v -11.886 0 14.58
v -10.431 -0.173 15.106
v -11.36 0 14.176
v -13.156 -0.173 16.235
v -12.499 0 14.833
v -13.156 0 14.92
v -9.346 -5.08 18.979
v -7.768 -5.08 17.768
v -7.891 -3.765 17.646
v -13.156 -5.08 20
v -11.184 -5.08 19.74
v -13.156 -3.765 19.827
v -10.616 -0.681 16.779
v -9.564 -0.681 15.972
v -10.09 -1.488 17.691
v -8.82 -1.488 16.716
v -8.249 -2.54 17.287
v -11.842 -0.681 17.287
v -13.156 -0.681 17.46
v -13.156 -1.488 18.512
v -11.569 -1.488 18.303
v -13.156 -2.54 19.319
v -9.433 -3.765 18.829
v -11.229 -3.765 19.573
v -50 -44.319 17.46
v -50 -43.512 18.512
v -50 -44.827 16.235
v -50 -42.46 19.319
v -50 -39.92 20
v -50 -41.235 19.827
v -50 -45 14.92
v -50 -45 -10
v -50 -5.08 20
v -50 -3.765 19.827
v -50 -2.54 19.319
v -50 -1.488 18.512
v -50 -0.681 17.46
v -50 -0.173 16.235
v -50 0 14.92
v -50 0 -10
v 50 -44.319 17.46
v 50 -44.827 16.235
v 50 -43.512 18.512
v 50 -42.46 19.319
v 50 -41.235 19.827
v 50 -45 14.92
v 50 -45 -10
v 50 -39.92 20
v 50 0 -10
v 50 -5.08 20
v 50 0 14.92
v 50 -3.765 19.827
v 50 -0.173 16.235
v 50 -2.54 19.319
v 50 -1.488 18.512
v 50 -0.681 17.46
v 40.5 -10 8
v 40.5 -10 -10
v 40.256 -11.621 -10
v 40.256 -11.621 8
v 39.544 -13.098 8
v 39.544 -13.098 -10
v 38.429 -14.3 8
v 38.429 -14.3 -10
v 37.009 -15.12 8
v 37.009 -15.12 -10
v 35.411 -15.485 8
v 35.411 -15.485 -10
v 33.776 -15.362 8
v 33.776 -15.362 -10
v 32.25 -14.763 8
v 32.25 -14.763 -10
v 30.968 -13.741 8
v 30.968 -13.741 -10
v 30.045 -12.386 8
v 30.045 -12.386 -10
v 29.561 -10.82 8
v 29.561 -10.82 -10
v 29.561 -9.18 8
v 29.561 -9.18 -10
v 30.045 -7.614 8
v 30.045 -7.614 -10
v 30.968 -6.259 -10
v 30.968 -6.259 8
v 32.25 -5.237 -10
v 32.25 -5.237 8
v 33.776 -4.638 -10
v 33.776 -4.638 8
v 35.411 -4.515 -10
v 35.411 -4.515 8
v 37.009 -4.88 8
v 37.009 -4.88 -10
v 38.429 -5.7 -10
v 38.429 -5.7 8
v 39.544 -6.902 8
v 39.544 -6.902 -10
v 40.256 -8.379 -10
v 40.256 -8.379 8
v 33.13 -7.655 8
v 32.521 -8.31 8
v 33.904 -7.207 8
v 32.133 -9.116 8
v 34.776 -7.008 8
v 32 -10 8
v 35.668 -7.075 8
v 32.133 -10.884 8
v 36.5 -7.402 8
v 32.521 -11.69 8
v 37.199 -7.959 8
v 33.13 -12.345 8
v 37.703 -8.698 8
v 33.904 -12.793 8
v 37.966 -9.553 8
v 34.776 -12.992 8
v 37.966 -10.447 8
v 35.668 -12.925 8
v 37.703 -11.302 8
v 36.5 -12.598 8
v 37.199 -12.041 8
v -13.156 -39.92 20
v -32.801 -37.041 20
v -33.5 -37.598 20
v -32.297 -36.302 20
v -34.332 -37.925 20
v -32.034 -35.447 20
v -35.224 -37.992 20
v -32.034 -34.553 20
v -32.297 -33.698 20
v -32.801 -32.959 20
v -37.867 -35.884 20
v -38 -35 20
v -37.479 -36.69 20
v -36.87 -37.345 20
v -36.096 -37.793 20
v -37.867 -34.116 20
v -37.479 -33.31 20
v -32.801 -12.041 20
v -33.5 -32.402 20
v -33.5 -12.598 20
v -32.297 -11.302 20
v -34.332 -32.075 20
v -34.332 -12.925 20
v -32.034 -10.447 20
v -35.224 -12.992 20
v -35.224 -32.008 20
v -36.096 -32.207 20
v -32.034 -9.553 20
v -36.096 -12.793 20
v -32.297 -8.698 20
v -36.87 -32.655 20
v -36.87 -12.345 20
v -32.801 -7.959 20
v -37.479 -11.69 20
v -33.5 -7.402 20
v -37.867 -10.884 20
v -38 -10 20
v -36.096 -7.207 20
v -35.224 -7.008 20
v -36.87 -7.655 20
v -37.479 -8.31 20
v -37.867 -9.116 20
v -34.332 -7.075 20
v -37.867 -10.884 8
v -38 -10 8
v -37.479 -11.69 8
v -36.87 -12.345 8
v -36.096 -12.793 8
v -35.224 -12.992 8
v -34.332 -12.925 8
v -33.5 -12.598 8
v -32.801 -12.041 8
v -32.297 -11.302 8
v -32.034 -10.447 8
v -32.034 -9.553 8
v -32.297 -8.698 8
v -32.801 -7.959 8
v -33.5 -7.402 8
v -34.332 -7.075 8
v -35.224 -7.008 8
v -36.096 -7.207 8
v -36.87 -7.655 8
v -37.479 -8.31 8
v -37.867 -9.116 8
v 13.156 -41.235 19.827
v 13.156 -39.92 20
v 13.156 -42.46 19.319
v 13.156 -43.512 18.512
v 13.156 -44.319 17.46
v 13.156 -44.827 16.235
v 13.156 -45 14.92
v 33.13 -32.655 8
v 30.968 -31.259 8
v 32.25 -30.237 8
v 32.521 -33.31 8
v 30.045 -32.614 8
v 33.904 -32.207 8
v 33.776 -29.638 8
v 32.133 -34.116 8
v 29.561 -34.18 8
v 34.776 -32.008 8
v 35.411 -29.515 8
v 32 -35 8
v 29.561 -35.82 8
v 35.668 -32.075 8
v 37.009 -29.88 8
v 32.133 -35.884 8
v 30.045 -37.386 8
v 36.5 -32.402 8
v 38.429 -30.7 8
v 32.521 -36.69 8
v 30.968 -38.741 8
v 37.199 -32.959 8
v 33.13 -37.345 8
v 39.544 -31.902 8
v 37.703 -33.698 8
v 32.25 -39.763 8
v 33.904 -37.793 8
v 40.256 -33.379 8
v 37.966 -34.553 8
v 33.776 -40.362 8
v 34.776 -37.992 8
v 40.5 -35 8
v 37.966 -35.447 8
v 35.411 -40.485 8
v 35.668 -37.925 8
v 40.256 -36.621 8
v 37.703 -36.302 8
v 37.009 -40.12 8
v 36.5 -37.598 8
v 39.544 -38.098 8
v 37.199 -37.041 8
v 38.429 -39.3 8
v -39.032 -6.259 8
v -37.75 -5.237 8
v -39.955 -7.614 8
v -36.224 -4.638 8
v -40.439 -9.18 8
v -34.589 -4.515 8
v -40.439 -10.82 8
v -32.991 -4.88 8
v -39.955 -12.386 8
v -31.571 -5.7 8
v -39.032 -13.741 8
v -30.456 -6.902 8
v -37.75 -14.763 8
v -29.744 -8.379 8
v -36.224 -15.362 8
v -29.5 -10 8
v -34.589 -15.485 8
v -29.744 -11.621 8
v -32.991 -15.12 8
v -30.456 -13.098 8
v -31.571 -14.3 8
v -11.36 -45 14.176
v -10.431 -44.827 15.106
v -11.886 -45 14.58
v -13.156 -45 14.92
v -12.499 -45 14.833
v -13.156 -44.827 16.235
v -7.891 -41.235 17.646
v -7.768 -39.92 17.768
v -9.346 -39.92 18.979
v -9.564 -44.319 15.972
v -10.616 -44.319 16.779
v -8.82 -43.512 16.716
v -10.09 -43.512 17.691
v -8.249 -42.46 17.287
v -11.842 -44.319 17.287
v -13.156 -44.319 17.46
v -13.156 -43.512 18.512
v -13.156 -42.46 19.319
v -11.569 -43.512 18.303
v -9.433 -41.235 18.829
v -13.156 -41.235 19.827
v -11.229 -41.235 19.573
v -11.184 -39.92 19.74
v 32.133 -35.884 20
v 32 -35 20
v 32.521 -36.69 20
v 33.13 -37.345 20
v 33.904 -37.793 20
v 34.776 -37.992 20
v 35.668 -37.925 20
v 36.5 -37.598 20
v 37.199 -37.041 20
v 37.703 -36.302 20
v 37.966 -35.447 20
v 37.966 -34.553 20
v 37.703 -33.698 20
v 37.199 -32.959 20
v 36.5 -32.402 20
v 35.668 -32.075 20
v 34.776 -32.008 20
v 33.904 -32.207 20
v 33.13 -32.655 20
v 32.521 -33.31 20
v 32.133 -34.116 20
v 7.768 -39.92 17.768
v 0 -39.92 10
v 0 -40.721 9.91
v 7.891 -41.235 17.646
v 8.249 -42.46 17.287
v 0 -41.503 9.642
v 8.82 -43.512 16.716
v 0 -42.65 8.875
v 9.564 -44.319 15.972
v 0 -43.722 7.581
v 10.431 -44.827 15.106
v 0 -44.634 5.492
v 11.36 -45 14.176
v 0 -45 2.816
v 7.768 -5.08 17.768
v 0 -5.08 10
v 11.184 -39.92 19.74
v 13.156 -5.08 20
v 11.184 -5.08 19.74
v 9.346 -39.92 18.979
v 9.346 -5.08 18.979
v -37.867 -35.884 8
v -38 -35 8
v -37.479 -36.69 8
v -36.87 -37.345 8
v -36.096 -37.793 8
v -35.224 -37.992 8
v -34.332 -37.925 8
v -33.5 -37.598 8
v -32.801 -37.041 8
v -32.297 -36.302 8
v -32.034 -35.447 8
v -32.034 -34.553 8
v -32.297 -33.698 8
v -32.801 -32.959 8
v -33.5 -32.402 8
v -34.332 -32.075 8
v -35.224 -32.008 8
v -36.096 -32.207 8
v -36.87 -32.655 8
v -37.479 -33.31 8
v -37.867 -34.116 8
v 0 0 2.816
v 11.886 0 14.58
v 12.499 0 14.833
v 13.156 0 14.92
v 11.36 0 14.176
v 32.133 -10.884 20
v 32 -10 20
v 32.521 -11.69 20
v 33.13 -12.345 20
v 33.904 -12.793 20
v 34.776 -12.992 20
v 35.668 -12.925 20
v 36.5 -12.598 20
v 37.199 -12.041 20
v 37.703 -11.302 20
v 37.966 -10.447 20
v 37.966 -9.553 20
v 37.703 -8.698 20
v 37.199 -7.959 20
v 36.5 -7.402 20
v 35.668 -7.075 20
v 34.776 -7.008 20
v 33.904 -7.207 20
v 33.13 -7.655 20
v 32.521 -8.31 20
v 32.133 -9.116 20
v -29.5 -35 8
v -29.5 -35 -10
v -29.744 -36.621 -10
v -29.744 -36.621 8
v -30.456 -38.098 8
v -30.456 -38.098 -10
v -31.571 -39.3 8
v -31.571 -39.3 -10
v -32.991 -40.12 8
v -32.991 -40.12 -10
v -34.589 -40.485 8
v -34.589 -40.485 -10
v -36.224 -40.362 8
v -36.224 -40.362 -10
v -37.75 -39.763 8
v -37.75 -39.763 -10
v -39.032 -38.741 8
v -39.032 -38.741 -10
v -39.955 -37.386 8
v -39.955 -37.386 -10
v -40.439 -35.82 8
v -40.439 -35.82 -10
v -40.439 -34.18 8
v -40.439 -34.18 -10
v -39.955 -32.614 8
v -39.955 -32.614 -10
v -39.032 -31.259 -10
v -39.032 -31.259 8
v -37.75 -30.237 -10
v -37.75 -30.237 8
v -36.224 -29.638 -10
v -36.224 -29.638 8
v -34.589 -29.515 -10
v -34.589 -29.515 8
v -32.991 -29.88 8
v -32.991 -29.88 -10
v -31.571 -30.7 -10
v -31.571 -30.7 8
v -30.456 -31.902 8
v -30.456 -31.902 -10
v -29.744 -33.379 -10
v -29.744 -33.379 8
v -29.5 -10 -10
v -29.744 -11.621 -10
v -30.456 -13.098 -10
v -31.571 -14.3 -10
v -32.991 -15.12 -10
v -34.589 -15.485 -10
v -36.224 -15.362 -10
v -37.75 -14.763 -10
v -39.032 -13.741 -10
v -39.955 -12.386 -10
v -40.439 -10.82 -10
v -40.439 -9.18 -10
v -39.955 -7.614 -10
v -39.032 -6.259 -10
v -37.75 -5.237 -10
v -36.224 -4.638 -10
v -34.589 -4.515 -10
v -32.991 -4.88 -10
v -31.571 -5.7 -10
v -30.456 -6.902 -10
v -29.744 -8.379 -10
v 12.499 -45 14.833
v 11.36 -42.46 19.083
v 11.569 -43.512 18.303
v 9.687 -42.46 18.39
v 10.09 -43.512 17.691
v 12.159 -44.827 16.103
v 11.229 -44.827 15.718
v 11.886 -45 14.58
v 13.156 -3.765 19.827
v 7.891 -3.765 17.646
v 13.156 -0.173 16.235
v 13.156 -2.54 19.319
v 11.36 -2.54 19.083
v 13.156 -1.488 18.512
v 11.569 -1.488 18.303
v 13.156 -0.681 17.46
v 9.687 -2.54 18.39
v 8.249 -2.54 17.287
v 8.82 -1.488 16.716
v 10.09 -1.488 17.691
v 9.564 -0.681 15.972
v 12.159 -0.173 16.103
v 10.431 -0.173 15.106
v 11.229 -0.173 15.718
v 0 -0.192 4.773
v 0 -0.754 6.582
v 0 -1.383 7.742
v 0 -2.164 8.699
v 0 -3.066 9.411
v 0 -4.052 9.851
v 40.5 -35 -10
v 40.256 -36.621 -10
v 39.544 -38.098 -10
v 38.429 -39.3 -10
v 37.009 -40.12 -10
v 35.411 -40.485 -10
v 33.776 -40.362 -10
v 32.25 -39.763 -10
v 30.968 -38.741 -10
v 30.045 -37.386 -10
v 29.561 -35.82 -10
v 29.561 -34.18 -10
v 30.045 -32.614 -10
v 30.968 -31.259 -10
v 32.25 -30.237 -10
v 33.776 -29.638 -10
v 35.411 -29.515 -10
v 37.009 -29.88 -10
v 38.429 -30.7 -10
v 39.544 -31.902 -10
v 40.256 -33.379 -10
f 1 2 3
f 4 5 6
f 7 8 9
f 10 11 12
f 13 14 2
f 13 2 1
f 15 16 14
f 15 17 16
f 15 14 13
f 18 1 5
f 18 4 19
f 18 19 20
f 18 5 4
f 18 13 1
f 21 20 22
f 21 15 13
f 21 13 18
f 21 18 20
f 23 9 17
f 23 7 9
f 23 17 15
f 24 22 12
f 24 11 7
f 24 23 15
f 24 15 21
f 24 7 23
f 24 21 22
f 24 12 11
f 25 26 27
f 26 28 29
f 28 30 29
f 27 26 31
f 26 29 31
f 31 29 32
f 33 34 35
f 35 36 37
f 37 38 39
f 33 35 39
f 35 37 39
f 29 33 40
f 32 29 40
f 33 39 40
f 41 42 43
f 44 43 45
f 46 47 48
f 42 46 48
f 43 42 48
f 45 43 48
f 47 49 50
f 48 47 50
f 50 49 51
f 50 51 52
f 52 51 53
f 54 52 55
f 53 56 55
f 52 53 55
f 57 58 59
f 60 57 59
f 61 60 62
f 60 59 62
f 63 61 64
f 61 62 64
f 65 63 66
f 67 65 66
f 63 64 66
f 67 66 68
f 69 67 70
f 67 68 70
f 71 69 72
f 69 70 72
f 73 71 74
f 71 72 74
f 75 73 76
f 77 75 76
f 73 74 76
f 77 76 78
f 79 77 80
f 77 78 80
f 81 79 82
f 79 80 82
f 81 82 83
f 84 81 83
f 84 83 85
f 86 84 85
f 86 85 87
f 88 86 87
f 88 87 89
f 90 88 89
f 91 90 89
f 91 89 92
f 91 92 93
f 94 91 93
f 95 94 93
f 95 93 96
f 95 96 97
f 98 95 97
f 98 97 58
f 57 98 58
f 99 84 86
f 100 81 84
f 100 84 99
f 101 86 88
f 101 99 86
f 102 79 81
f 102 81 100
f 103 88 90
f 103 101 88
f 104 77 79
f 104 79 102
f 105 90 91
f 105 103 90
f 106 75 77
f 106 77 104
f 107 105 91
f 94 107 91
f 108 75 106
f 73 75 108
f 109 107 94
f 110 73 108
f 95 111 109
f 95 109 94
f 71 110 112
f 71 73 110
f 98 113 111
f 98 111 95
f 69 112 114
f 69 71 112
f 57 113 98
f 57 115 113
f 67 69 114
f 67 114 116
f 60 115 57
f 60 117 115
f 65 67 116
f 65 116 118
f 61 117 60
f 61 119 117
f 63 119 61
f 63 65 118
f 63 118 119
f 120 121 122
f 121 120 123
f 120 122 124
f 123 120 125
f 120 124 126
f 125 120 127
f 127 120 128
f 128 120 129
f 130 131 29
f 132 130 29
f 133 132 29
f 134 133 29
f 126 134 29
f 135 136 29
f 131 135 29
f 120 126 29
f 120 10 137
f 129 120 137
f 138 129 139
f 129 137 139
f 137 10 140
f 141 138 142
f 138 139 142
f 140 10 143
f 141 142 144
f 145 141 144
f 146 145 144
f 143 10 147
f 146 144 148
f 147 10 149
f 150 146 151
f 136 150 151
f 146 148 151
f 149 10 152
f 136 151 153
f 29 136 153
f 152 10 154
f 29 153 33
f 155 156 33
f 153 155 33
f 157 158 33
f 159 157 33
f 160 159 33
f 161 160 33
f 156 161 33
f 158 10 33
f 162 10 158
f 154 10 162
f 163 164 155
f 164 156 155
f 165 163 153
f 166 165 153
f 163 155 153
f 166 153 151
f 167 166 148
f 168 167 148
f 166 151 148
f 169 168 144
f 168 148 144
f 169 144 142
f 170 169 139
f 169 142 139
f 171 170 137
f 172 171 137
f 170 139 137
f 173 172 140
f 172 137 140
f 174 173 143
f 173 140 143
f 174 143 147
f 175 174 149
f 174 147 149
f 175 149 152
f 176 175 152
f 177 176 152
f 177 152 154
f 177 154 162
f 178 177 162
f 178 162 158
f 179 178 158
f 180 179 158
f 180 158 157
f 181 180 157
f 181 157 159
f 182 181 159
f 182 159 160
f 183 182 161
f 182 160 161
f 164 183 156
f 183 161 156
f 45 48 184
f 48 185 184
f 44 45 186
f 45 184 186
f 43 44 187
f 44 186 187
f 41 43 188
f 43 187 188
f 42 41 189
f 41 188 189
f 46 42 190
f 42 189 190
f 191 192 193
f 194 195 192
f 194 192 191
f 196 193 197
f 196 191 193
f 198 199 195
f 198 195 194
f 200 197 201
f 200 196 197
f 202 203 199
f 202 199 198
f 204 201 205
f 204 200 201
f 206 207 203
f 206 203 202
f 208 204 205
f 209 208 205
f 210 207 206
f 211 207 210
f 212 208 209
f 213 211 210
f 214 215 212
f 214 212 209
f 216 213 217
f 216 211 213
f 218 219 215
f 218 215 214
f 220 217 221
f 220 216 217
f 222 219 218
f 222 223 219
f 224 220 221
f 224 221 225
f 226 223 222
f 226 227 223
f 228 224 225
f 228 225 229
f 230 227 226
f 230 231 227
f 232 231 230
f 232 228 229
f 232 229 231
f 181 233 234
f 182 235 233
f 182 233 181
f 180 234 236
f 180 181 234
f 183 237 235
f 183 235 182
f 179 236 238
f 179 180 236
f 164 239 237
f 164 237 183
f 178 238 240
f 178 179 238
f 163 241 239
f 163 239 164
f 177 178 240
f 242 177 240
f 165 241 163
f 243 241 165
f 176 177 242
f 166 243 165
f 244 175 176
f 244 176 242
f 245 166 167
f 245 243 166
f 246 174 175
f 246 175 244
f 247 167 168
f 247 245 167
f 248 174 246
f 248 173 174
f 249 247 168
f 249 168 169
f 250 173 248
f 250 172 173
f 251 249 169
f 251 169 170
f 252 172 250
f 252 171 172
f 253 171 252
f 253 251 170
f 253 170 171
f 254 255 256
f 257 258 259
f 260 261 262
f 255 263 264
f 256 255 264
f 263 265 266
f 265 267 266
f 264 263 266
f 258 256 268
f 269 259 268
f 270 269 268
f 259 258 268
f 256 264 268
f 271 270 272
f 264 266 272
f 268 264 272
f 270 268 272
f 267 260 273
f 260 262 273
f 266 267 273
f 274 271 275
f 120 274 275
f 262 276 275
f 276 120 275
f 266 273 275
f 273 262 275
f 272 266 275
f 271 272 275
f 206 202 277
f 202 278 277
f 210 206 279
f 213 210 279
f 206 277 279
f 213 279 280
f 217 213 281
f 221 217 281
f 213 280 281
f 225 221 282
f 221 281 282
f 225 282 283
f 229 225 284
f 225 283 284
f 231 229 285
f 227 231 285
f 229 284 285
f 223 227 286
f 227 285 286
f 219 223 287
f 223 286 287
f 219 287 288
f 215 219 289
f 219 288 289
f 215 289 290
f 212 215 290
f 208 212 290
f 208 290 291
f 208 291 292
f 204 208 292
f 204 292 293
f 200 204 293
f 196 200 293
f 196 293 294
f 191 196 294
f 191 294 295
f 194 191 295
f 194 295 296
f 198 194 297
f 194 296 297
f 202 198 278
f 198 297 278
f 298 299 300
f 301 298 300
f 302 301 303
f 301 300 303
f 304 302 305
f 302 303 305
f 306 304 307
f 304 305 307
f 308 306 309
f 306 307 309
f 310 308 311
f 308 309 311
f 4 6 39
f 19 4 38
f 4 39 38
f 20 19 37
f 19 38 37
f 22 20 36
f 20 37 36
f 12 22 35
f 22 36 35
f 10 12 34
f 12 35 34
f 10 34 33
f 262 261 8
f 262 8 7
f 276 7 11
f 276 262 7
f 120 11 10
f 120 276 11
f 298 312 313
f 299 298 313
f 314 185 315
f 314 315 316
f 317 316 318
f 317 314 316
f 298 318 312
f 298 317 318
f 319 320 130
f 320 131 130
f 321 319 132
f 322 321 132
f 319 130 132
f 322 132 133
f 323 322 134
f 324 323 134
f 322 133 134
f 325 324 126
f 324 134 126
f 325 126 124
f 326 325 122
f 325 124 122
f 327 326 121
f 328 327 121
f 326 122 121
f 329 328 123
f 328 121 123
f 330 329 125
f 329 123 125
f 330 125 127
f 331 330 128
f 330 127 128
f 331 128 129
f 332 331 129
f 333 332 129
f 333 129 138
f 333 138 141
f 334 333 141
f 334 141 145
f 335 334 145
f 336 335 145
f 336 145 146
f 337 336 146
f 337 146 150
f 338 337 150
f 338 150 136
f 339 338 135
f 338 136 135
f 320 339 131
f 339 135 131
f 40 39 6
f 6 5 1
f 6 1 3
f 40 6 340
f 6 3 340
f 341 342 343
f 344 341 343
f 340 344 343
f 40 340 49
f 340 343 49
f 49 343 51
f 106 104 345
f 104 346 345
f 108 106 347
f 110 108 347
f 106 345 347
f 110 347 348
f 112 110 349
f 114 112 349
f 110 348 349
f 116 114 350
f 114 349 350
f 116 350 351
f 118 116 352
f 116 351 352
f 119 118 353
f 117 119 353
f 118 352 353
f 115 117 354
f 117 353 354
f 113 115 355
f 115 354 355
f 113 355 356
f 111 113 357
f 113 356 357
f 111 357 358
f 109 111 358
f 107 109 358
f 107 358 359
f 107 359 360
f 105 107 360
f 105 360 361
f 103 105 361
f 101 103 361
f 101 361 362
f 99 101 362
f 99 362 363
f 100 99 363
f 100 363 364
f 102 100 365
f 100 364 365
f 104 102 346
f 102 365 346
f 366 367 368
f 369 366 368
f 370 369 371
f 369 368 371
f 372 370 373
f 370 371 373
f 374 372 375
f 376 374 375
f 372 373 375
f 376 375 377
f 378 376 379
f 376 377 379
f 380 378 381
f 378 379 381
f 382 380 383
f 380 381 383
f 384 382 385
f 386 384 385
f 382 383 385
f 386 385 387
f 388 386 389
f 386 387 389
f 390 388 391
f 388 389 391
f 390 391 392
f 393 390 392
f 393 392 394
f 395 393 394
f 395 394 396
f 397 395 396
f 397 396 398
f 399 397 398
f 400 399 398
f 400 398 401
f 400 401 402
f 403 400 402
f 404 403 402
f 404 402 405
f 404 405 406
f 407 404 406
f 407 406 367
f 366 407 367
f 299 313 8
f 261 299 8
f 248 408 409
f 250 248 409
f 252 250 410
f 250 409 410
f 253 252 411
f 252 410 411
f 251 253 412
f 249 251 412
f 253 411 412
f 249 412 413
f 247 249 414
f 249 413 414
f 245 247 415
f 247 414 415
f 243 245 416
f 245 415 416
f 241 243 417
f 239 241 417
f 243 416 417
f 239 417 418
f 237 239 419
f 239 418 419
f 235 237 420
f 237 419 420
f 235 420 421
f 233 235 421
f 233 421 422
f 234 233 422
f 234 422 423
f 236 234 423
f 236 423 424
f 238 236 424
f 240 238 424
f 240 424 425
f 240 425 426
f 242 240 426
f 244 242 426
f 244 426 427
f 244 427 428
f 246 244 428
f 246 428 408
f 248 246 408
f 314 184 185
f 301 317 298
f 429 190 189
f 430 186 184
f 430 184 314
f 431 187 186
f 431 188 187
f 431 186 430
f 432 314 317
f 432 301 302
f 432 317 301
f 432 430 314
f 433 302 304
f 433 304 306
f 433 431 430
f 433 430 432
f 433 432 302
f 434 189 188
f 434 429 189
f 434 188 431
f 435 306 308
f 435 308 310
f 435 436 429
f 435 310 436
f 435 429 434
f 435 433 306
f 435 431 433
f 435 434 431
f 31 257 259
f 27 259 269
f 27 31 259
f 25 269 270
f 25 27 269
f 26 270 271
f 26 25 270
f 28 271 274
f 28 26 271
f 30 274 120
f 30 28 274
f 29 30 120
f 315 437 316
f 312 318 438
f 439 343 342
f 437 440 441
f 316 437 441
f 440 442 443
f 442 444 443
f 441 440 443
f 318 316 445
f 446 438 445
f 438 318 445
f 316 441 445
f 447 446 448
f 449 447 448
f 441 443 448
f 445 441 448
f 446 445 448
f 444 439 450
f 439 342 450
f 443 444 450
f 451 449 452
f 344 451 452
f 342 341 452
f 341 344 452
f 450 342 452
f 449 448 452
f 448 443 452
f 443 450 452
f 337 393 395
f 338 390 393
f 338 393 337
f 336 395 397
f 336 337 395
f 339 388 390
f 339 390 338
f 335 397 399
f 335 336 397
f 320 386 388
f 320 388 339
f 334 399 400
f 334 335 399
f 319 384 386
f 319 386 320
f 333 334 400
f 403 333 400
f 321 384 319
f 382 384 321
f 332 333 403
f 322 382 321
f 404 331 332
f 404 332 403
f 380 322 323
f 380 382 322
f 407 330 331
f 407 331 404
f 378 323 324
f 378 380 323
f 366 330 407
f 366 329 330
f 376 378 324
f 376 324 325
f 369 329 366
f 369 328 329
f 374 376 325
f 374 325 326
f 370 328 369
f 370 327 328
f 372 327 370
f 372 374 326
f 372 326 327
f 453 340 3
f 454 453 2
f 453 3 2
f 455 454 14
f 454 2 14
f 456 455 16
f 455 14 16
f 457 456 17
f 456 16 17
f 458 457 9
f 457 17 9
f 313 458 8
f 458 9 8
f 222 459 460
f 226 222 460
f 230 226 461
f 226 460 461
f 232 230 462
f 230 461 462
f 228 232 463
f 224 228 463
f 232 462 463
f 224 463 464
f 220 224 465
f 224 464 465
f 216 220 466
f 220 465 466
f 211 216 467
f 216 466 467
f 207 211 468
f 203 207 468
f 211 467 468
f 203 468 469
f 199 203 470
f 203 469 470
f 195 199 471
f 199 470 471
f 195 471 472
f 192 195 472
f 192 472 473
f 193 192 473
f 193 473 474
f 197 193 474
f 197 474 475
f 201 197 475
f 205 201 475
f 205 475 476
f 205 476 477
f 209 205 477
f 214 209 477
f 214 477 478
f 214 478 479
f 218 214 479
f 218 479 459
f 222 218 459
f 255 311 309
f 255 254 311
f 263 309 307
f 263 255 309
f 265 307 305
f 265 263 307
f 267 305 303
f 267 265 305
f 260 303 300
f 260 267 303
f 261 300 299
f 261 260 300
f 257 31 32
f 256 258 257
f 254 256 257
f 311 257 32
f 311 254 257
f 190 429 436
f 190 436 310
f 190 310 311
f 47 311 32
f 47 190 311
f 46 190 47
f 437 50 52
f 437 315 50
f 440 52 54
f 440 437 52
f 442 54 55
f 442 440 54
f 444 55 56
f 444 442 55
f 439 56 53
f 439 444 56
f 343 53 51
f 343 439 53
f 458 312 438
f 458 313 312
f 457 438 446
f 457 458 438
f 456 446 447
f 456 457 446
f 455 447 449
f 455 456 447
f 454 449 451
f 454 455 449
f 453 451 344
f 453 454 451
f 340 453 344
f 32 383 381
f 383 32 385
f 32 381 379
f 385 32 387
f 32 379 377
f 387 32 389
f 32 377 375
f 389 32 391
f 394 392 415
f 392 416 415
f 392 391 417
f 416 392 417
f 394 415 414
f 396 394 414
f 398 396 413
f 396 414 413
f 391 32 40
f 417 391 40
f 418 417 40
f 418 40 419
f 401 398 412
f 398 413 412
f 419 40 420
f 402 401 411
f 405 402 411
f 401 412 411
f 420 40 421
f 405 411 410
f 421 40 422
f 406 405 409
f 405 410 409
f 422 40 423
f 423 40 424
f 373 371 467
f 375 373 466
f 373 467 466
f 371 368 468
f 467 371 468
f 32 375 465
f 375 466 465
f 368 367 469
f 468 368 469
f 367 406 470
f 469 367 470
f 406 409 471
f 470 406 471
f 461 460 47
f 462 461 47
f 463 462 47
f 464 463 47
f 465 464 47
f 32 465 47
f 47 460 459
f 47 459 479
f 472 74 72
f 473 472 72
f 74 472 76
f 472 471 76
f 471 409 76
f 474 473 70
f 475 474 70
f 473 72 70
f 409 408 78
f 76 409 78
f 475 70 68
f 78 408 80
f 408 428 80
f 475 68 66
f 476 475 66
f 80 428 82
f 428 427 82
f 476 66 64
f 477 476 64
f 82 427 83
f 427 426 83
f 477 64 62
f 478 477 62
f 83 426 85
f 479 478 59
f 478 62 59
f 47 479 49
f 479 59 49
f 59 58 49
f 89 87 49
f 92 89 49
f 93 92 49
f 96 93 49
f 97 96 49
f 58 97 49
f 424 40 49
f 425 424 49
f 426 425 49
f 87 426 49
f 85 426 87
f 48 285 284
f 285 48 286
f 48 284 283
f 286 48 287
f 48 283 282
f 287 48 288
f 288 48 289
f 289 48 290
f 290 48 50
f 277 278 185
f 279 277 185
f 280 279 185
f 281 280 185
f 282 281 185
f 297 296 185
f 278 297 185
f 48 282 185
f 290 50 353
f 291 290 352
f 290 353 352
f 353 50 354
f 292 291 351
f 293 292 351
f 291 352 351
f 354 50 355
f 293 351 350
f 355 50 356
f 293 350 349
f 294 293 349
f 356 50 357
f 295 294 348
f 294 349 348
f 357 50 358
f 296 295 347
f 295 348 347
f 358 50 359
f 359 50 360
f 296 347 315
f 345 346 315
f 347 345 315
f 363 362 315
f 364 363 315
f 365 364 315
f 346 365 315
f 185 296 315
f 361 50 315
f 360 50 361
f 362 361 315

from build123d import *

# Parameters (mm, degrees)
F1_DEPTH       = 45
F2_R           = 7.62
F3_R           = 5.08
F5_D           = 6
F5_CBORE_D     = 11
F5_CBORE_DEPTH = 18


with BuildPart() as f1:
    # F0 (on Front) → F1 (new body)
    with BuildSketch(Plane.XZ):
        Polygon((50, 20), (20, 20), (10, 20), (0, 10), (-10, 20), (-20, 20), (-50, 20), (-50, 0), (-50, -10), (50, -10), (50, 0), align=None)
    extrude(amount=F1_DEPTH)

    # F2
    f2_edges = [f1.edges().sort_by_distance(p)[0] for p in [
        (10, -22.5, 20),
        (-10, -22.5, 20),
    ]]
    fillet(f2_edges, radius=F2_R)

    # F3
    f3_edges = [f1.edges().sort_by_distance(p)[0] for p in [
        (-31.578154, -45, 20),
        (31.578154, -45, 20),
        (31.578154, 0, 20),
        (-31.578154, 0, 20),
    ]]
    fillet(f3_edges, radius=F3_R)

    # F5 (through all)
    with Locations(Plane(origin=(0, 0, -10), x_dir=(1, 0, 0), z_dir=(0, 0, -1))):
        with Locations((35, 10), (35, 35), (-35, 35), (-35, 10)):
            CounterBoreHole(F5_D / 2, F5_CBORE_D / 2, F5_CBORE_DEPTH)


solid = f1.part
